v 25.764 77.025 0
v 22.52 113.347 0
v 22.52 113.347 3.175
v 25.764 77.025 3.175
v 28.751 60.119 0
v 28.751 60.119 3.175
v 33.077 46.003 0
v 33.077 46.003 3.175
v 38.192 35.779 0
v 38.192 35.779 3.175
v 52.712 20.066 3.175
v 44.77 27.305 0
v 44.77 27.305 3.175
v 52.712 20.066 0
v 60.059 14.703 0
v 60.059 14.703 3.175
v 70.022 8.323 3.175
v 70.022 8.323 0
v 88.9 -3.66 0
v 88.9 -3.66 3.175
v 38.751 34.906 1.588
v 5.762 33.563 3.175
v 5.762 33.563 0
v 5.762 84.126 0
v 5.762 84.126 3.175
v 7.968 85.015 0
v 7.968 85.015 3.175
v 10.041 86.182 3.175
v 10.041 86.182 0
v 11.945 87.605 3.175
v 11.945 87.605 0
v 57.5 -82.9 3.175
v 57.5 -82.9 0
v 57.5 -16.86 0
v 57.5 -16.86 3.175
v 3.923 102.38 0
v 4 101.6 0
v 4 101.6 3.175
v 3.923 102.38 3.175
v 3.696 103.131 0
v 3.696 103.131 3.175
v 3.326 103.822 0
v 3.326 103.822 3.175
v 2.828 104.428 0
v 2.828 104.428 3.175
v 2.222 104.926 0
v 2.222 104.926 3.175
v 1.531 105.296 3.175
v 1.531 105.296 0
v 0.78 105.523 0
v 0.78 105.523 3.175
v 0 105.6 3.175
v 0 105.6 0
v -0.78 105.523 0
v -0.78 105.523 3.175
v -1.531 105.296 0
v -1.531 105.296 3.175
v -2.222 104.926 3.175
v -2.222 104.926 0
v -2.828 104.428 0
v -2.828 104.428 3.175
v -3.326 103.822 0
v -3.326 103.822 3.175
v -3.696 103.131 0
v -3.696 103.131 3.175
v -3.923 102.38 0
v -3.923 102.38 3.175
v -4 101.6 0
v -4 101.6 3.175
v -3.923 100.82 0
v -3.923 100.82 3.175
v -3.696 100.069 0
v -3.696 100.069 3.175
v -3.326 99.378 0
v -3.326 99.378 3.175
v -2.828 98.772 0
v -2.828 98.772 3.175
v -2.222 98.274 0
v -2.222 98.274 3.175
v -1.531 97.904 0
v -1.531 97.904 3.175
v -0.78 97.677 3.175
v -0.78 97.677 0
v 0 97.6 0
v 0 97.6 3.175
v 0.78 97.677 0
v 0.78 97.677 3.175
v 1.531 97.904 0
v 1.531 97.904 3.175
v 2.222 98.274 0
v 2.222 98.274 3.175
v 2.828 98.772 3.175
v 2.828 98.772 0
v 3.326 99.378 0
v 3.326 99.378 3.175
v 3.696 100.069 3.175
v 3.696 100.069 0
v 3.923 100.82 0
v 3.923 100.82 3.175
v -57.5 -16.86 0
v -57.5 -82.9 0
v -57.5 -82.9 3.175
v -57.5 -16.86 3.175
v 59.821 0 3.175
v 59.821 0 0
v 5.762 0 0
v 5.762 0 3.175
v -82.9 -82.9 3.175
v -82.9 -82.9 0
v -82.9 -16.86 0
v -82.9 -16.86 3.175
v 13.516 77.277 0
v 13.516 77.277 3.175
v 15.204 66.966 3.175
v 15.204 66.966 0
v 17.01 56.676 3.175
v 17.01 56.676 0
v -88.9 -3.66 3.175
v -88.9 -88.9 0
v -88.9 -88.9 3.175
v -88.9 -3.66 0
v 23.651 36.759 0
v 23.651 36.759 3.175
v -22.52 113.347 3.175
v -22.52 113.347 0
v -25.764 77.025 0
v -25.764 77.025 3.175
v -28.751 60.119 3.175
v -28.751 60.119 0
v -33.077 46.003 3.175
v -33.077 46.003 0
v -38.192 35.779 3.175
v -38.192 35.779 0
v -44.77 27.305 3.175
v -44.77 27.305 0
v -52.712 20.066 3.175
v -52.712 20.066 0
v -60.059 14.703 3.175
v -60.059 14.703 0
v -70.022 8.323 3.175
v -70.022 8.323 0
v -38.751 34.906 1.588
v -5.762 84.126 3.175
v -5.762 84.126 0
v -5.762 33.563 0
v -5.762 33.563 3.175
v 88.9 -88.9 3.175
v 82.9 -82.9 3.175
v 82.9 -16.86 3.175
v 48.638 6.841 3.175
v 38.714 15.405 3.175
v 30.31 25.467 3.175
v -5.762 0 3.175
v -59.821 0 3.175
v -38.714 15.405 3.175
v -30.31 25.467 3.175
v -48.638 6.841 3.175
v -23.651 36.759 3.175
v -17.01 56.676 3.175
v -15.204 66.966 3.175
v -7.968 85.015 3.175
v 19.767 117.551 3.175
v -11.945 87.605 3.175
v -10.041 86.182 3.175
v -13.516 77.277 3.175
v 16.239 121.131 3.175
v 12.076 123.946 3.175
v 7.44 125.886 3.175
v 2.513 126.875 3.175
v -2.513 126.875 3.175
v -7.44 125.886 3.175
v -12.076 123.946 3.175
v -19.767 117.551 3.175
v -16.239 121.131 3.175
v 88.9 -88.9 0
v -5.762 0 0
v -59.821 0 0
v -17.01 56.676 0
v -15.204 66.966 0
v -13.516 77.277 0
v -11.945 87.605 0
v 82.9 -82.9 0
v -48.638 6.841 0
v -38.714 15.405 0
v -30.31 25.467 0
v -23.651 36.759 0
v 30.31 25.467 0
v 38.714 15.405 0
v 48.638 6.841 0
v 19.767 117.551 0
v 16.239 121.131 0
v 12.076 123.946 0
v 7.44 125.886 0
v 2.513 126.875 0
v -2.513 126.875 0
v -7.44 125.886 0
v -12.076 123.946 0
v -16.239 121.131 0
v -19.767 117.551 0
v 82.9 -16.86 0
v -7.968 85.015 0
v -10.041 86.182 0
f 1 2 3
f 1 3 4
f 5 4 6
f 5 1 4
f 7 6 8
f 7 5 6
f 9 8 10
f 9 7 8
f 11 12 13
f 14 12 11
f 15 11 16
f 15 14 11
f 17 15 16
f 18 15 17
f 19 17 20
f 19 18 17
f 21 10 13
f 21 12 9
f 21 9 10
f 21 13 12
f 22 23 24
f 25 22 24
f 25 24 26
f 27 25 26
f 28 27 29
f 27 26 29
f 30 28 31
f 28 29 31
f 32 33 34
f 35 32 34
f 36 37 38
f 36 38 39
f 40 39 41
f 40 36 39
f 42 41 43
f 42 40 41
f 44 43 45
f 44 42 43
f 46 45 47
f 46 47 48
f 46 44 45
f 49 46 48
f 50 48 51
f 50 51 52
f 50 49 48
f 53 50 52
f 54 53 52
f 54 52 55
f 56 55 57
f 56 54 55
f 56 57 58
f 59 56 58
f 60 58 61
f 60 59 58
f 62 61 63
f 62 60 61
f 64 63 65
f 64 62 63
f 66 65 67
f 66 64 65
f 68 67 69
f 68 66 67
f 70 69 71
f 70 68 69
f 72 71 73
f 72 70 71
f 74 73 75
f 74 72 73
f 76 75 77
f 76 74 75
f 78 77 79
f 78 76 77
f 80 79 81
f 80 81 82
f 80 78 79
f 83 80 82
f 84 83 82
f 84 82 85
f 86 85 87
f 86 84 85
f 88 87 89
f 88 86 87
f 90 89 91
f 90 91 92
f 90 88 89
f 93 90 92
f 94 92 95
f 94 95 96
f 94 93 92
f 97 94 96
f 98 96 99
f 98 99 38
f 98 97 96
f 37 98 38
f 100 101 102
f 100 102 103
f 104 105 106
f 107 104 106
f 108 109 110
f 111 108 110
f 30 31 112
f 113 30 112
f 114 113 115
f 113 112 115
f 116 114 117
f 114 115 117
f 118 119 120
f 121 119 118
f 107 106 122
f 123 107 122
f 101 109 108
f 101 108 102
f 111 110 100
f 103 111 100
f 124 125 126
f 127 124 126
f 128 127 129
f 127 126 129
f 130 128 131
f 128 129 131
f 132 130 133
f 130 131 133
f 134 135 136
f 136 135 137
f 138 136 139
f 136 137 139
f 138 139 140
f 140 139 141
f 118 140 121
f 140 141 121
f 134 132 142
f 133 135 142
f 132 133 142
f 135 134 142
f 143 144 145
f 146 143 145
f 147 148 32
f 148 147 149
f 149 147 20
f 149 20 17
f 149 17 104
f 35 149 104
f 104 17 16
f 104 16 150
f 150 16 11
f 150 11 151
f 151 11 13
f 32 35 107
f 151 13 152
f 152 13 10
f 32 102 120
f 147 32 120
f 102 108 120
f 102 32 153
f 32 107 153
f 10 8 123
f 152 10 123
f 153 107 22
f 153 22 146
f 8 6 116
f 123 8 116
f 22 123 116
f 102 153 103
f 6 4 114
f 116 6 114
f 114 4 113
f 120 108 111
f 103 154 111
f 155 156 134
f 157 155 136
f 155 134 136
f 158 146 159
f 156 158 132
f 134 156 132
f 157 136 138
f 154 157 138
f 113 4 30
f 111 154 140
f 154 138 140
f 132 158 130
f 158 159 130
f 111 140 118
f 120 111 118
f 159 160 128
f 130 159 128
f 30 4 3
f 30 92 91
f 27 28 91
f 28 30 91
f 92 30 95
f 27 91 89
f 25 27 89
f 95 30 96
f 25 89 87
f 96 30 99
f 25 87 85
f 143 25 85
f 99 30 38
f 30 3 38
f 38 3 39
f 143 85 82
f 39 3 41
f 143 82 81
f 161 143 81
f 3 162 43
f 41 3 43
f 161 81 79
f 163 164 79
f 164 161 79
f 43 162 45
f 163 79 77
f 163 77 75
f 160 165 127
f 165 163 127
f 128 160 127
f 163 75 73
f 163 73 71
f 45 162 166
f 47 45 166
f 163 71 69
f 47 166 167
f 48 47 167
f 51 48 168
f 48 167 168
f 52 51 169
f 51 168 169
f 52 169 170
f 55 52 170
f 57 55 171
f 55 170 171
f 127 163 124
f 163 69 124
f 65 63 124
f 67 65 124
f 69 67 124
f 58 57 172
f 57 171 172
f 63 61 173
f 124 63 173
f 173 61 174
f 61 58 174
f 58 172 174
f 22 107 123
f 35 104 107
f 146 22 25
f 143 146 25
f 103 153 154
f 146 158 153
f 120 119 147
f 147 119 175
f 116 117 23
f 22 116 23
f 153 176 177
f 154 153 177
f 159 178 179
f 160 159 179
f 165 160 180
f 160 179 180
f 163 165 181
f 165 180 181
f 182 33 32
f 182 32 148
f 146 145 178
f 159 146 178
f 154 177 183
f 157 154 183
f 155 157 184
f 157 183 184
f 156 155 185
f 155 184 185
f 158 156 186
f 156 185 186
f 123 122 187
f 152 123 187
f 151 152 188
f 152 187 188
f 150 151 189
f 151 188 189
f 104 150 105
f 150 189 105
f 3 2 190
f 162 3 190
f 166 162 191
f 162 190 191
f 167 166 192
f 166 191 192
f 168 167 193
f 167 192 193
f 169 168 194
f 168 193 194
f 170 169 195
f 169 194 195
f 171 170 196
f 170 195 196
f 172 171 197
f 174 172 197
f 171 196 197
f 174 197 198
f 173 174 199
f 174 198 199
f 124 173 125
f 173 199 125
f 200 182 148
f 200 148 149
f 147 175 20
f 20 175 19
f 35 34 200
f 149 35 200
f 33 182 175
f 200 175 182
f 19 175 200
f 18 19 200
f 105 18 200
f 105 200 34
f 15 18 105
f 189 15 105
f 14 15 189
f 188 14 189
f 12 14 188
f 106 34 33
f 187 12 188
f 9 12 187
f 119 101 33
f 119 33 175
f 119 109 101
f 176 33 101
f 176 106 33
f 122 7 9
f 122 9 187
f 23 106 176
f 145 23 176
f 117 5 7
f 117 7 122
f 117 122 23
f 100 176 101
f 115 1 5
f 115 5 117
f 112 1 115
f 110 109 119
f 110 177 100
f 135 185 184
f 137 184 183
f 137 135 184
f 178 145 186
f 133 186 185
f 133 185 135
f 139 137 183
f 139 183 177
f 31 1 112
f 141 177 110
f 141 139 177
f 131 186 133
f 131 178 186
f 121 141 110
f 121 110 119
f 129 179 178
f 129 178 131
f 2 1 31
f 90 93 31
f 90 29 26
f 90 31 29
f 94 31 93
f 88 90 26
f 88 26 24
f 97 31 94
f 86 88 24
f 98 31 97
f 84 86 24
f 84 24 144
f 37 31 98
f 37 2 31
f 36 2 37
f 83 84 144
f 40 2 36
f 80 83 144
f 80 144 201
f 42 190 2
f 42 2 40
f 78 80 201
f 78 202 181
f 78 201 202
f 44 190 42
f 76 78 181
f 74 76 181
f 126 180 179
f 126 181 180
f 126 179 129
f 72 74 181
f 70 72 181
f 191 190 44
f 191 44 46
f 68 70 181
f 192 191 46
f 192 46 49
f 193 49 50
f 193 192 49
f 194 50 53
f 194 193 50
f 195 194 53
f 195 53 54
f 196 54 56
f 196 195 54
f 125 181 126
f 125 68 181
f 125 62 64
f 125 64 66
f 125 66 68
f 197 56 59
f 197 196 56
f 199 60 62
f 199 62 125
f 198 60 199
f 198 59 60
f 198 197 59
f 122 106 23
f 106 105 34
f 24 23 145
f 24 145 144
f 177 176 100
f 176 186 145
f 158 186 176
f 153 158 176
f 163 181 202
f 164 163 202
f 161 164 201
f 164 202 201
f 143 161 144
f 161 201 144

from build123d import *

# Parameters (mm, degrees)
F0_R     = 4
F0_W     = 177.8
F0_H     = 85.24
F0_W_2   = 25.4
F0_H_2   = 66.04
F1_DEPTH = 3.175


with BuildPart() as f1:
    # F0 (on Top) → F1 (new body)
    with BuildSketch(Plane.XY):
        with BuildLine():
            add(Edge.make_bspline(
                [(22.5202294805, 113.3473088044), (24.6785630933, 84.2312430336), (27.5522275569, 27.268327843), (69.7704020362, 9.5247320193), (88.8999999985, -3.66)],
                knots=[0, 0, 0, 0, 0.529467504, 1, 1, 1, 1], degree=3))
            ThreePointArc((22.5202294805, 113.3473088043), (1e-10, 127), (-22.5202294805, 113.3473088044))
            add(Edge.make_bspline(
                [(-22.5202294805, 113.3473088044), (-24.6785630933, 84.2312430336), (-27.5522275569, 27.268327843), (-69.7704020362, 9.5247320193), (-88.8999999985, -3.66)],
                knots=[0, 0, 0, 0, 0.529467504, 1, 1, 1, 1], degree=3))
            Line((-88.8999999985, -3.66), (88.9000000015, -3.66))
        make_face()
        with BuildLine():
            ThreePointArc((-59.8212145269, 0), (-38.7136496278, 15.4052324982), (-23.6512337148, 36.7587828155))
            Line((-23.6512337148, 36.7587828155), (-5.7622946509, 0))
            Line((-5.7622946509, 0), (-59.8212145269, 0))
        make_face(mode=Mode.SUBTRACT)
        with BuildLine():
            Line((5.7622946509, 0), (23.6512337148, 36.7587828155))
            ThreePointArc((23.6512337148, 36.7587828155), (38.7136496278, 15.4052324982), (59.8212145269, 0))
            Line((59.8212145269, 0), (5.7622946509, 0))
        make_face(mode=Mode.SUBTRACT)
        with BuildLine():
            Line((-5.7622946509, 33.5634882355), (-17.0102279312, 56.676113031))
            ThreePointArc((-17.0102279312, 56.676113031), (-14.345117084, 72.11901875), (-11.9453535958, 87.6053768783))
            ThreePointArc((-11.9453535958, 87.6053768783), (-9.0231108807, 85.5649004094), (-5.7622946509, 84.1261077832))
            Line((-5.7622946509, 84.1261077832), (-5.7622946509, 33.5634882355))
        make_face(mode=Mode.SUBTRACT)
        with Locations((0, 101.6)):
            Circle(F0_R, mode=Mode.SUBTRACT)
        with BuildLine():
            Line((5.7622946509, 33.5634882355), (5.7622946509, 84.1261077832))
            ThreePointArc((5.7622946509, 84.1261077832), (9.0231108807, 85.5649004094), (11.9453535958, 87.6053768783))
            ThreePointArc((11.9453535958, 87.6053768783), (14.345117084, 72.11901875), (17.0102279312, 56.676113031))
            Line((17.0102279312, 56.676113031), (5.7622946509, 33.5634882355))
        make_face(mode=Mode.SUBTRACT)
        with Locations((1.5e-09, -46.28)):
            Rectangle(F0_W, F0_H)
        with Locations((-70.1999999985, -49.88)):
            Rectangle(F0_W_2, F0_H_2, mode=Mode.SUBTRACT)
        with Locations((70.1999999985, -49.88)):
            Rectangle(F0_W_2, F0_H_2, mode=Mode.SUBTRACT)
    extrude(amount=F1_DEPTH)


solid = f1.part
